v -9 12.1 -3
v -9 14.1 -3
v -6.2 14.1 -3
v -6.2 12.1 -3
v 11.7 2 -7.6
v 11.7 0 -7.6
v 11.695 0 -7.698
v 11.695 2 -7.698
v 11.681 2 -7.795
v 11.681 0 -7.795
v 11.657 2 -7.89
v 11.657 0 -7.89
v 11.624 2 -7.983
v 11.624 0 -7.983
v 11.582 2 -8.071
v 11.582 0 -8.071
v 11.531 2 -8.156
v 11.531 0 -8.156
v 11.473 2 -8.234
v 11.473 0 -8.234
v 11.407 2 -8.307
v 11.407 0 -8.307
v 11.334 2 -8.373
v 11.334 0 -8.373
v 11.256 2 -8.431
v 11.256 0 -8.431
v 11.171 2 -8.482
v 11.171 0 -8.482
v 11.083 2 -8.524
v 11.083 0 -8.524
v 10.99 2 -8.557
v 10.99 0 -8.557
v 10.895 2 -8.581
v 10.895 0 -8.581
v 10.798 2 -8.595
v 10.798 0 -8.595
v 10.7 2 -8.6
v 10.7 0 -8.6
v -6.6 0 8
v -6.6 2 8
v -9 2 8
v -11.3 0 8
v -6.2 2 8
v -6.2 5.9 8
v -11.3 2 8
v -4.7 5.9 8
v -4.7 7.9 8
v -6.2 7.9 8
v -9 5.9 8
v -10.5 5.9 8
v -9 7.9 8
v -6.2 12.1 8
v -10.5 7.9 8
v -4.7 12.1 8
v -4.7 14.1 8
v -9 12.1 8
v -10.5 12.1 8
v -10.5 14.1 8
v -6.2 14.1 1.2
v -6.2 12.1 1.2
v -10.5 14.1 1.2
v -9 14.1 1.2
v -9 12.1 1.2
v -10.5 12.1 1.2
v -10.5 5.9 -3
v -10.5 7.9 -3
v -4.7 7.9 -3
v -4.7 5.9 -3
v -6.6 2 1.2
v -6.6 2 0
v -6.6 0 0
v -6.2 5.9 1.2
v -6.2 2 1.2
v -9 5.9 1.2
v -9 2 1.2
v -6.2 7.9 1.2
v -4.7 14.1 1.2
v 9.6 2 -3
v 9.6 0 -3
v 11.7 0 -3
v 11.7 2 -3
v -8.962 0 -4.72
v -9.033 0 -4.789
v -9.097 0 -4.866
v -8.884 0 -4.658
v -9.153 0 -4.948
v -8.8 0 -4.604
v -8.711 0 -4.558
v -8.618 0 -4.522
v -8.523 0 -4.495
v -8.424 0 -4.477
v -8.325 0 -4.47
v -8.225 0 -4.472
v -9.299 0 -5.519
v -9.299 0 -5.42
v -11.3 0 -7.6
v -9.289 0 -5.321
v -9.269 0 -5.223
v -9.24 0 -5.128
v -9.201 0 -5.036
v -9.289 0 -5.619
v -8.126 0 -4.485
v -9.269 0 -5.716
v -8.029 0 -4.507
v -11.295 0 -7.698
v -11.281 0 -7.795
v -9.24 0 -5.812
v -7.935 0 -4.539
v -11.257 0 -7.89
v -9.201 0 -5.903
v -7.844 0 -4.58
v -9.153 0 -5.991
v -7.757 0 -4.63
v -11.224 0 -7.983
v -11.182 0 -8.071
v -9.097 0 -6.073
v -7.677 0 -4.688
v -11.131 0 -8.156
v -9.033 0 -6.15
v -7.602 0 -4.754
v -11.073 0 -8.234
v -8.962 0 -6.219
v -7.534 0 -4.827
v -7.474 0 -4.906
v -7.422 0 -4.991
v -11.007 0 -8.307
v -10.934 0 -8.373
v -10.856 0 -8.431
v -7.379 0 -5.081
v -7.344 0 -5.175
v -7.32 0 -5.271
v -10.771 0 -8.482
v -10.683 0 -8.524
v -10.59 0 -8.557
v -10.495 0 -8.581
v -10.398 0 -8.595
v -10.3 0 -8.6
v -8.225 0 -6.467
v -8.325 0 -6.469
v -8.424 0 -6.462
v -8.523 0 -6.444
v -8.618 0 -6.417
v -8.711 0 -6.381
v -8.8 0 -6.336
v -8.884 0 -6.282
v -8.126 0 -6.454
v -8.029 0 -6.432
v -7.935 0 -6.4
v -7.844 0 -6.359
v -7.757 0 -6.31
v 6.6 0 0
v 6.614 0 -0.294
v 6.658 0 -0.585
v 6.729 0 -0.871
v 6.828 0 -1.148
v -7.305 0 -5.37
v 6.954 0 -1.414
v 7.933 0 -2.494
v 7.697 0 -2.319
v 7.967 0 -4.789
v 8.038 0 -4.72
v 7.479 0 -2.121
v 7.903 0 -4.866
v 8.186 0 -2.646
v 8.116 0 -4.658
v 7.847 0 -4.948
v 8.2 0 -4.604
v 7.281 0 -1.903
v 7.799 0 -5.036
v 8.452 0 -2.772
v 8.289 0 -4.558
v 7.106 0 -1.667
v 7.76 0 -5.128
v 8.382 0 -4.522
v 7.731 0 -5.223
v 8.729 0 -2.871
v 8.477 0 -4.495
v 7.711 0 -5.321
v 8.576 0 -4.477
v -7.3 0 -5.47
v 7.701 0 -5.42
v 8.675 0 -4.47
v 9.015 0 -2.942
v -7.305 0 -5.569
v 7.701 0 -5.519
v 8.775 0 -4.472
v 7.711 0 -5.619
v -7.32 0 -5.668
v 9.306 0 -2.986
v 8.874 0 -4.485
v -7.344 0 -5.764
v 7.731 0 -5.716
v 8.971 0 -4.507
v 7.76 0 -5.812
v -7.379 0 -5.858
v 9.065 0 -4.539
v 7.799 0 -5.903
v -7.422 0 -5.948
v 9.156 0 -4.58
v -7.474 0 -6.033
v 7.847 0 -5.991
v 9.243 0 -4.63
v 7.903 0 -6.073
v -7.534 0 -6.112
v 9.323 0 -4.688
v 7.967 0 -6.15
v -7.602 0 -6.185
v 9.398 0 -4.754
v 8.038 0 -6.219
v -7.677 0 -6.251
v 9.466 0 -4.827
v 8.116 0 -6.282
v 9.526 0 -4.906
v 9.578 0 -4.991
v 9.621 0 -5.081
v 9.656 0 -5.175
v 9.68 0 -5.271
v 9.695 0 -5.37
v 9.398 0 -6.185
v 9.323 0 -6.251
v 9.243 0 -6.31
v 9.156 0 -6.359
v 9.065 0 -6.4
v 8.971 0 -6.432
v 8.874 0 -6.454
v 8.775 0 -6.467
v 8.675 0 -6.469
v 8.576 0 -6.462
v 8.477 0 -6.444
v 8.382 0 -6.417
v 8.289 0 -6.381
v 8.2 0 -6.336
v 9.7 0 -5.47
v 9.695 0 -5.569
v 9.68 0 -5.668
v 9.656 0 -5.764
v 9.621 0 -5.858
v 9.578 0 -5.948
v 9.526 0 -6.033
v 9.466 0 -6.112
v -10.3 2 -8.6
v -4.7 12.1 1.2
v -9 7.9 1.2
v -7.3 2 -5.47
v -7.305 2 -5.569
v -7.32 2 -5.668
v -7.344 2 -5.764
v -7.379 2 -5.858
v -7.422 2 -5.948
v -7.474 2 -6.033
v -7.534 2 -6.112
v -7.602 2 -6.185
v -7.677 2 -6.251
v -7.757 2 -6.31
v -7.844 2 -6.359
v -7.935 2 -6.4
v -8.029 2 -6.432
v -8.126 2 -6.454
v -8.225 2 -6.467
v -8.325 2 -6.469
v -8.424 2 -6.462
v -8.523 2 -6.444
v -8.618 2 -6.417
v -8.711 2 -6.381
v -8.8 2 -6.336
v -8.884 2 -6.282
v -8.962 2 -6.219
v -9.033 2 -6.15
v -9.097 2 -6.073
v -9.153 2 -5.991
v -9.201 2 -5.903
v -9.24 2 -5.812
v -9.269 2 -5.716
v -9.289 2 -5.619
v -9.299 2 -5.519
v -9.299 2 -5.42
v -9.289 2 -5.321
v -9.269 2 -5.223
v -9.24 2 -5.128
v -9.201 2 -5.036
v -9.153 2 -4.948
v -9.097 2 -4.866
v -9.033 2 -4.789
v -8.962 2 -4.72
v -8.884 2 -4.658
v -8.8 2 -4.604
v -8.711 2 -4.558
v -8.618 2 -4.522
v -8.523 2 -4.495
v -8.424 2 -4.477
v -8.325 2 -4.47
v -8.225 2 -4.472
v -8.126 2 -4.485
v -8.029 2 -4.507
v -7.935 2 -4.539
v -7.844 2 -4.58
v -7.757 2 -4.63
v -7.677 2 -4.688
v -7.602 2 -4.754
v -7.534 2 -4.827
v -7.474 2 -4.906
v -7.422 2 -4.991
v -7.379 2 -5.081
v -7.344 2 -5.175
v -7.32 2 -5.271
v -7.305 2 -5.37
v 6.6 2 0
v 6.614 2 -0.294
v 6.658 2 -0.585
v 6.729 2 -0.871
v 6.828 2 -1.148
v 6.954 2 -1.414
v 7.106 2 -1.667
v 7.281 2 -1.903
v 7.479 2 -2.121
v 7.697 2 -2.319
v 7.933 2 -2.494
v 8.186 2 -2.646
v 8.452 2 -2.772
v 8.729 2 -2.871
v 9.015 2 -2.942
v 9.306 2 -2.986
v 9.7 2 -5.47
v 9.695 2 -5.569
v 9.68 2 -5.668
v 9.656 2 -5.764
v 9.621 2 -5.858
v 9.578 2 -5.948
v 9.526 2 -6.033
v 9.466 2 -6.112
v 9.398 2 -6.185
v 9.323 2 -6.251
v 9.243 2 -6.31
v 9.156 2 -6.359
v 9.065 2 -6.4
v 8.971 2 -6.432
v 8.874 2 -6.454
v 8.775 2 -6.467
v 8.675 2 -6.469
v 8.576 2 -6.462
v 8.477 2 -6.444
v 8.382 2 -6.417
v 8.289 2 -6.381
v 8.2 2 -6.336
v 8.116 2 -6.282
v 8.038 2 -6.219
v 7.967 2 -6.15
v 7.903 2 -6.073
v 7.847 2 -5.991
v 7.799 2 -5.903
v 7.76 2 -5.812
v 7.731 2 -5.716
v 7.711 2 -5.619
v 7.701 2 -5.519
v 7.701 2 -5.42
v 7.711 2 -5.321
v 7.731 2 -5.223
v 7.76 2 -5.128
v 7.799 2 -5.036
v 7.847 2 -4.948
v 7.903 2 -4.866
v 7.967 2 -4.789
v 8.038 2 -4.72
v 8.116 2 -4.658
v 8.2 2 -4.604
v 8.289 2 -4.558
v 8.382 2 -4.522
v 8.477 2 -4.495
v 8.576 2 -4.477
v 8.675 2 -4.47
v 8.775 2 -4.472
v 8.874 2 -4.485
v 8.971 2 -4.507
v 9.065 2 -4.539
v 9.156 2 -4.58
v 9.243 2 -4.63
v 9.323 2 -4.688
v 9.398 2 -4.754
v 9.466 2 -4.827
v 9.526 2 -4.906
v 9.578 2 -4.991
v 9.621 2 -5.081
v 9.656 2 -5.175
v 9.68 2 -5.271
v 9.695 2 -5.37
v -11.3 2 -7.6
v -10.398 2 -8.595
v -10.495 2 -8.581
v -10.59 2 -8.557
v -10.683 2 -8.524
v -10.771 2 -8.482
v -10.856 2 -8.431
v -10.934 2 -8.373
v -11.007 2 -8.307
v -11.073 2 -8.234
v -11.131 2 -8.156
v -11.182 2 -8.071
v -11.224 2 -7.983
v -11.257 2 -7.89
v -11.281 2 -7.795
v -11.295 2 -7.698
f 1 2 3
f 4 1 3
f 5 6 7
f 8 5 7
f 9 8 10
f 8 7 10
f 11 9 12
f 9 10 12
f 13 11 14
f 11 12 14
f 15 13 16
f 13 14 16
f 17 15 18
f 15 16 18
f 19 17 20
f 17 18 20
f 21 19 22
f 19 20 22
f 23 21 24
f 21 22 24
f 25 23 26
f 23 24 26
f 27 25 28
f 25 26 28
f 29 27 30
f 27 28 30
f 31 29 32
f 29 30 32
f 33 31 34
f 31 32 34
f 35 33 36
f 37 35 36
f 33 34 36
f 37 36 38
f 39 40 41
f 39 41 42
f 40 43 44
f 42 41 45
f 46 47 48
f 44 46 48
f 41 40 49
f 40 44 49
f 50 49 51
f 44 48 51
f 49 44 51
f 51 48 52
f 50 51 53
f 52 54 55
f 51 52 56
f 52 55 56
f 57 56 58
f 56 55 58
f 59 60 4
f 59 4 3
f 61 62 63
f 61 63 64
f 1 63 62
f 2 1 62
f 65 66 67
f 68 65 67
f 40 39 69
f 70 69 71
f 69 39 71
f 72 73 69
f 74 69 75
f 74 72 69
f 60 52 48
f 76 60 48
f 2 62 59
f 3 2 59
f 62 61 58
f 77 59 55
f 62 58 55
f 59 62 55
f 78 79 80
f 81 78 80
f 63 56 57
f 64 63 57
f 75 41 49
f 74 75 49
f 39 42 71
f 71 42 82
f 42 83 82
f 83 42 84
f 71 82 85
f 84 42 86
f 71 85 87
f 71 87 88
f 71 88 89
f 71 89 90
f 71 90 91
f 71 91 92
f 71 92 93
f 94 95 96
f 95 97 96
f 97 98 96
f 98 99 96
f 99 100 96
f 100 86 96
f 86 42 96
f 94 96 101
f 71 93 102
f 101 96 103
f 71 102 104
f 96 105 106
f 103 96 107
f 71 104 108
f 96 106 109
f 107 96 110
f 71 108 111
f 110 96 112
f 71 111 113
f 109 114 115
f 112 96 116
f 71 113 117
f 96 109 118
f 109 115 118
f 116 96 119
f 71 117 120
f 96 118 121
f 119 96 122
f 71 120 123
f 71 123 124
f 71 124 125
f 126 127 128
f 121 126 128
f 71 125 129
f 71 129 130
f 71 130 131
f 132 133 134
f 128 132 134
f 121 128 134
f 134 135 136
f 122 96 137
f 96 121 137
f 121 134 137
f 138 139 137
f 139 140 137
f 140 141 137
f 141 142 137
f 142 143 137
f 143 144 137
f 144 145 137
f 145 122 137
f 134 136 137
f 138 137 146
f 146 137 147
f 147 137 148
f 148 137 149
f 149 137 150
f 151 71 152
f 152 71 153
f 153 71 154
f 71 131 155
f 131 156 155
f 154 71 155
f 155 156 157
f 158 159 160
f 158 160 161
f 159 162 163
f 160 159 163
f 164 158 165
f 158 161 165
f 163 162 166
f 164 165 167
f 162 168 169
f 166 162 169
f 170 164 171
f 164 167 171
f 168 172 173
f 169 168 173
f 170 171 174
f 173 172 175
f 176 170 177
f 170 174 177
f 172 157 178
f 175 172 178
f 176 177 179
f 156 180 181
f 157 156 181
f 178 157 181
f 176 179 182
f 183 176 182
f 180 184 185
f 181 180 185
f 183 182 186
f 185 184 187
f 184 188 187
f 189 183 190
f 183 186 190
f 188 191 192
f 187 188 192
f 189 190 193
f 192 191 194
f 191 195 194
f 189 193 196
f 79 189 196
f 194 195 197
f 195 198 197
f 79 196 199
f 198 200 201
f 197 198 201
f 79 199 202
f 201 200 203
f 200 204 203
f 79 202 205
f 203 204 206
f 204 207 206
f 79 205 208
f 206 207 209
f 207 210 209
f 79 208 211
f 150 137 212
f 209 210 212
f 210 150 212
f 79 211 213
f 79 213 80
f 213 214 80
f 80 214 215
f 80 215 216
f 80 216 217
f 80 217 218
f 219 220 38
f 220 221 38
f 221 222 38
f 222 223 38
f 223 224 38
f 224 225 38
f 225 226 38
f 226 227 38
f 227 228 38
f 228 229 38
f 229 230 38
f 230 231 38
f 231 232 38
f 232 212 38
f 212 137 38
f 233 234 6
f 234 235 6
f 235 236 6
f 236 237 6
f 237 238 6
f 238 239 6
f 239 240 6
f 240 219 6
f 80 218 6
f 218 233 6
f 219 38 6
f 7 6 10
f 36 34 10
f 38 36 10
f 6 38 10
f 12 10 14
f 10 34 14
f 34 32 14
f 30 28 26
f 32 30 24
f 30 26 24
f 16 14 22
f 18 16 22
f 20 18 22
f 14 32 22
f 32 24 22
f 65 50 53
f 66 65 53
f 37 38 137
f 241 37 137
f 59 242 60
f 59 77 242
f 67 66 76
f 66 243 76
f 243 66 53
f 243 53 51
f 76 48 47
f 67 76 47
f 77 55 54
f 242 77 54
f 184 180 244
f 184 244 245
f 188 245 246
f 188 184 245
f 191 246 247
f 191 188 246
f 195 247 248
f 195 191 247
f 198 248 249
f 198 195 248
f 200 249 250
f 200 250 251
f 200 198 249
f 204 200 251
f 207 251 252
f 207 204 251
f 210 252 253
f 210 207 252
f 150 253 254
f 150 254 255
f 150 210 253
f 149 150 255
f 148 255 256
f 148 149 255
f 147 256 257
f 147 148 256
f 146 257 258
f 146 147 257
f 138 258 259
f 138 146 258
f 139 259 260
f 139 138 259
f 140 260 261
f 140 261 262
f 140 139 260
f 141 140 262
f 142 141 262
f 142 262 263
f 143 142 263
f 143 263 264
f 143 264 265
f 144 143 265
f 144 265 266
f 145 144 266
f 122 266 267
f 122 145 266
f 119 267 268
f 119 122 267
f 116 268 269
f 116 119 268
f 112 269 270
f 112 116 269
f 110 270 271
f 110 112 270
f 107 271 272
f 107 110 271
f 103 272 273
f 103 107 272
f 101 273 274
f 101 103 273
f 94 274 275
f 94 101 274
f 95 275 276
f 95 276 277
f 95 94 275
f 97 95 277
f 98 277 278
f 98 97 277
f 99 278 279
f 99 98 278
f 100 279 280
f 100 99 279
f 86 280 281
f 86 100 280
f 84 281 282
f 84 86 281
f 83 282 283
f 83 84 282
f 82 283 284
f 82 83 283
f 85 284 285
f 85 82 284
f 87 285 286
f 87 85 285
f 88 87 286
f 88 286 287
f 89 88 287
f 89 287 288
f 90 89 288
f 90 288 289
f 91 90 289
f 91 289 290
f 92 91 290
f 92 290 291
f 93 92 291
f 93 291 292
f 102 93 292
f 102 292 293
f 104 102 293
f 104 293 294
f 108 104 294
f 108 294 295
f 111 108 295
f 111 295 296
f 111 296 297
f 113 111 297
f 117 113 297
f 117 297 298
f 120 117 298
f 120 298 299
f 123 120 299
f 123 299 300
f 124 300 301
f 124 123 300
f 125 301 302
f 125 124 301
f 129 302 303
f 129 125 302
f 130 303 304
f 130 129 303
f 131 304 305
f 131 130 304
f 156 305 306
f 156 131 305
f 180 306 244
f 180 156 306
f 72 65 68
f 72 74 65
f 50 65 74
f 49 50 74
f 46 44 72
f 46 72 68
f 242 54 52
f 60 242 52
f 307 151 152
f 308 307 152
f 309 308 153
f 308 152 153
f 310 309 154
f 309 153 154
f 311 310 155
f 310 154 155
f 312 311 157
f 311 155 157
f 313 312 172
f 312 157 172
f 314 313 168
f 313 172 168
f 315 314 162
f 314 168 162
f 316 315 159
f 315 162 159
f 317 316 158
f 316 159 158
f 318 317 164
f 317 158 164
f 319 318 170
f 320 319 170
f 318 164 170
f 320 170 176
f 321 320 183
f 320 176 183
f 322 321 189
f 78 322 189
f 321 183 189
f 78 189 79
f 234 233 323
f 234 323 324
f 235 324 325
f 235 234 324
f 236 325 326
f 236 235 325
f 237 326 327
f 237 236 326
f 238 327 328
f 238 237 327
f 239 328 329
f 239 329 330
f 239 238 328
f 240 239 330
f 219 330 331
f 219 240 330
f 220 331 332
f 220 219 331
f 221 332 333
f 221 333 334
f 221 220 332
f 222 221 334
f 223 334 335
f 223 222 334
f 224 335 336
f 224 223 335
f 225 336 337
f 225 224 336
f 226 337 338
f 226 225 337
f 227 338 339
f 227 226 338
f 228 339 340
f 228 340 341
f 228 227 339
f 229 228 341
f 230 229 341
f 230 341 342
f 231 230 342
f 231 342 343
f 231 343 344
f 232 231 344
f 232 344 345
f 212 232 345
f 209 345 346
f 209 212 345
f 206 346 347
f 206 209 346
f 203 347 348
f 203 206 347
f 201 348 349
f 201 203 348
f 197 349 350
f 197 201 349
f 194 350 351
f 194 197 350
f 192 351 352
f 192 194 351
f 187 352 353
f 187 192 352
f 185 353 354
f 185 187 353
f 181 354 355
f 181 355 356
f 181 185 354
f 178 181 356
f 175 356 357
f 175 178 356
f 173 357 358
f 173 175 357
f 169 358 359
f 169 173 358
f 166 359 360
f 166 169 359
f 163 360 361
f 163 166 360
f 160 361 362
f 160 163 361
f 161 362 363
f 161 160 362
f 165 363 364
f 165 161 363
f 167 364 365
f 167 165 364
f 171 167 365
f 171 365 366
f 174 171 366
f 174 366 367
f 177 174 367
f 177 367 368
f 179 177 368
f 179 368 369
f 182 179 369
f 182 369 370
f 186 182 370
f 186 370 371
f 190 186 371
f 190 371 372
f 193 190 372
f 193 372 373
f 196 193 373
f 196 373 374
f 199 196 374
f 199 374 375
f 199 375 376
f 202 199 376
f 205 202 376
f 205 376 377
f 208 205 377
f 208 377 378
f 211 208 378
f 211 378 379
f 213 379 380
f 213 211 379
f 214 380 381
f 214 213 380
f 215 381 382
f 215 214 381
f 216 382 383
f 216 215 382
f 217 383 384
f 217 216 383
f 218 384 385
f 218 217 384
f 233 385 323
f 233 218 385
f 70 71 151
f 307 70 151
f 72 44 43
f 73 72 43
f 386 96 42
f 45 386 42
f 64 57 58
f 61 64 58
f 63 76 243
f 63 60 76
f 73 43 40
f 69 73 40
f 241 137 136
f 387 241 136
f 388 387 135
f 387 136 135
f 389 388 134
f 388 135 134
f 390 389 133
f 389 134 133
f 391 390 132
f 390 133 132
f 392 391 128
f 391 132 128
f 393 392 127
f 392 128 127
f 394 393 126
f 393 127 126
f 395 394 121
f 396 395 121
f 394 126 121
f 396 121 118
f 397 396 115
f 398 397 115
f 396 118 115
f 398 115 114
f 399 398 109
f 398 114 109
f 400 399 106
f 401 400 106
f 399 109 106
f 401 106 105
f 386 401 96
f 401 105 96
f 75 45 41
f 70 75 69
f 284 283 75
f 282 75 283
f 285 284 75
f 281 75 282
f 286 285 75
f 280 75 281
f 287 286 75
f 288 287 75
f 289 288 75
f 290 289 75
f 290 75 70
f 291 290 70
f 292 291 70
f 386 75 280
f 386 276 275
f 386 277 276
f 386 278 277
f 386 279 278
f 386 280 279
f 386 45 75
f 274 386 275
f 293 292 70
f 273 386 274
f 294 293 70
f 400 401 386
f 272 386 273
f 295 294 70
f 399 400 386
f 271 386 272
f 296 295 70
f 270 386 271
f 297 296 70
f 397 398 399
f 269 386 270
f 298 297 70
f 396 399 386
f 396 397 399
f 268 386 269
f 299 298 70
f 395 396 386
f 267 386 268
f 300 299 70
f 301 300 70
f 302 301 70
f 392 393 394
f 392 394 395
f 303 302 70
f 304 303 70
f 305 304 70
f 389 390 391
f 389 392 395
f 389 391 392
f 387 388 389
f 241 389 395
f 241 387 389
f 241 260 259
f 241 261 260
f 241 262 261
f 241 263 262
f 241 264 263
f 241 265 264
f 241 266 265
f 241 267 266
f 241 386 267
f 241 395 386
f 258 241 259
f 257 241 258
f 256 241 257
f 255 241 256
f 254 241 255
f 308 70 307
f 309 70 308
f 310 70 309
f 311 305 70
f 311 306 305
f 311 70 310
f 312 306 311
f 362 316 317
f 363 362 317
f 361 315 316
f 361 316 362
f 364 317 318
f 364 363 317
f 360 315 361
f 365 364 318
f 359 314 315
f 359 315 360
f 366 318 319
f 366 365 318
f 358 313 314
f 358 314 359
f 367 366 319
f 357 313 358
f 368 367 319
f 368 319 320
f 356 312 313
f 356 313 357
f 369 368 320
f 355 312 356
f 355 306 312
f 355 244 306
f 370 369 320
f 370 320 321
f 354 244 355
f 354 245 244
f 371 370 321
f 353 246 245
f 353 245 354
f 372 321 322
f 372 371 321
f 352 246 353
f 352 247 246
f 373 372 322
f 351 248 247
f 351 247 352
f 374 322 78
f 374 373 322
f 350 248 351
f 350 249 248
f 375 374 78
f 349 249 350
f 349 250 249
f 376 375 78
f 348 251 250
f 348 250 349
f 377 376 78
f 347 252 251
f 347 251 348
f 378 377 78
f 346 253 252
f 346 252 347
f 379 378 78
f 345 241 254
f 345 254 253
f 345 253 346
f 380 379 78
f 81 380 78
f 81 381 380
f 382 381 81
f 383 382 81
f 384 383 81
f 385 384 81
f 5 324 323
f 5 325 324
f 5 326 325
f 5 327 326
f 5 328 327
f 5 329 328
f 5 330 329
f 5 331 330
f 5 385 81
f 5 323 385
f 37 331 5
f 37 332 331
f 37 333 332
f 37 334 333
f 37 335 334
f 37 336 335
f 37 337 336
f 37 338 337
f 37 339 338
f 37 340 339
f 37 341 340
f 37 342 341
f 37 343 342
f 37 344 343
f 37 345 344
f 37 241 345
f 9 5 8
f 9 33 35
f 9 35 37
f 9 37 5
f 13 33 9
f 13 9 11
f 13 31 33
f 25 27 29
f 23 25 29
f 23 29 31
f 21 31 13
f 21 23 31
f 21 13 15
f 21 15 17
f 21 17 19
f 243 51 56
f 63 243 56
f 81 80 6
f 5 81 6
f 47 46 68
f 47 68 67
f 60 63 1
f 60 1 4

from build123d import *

# Parameters (mm, degrees)
SKETCH1_R           = 1
BOSS_EXTRUDE1_DEPTH = 2
BOSS_EXTRUDE2_START = 8
BOSS_EXTRUDE2_DEPTH = 6.8
SKETCH3_W           = 2.8
SKETCH3_H           = 2
SKETCH3_W_2         = 5.8
BOSS_EXTRUDE3_DEPTH = 11


with BuildPart() as part:
    # Sketch1 → Boss-Extrude1 (new body)
    with BuildSketch(Plane(origin=(0, 0, 0), x_dir=(1, 0, 0), z_dir=(0, 1, 0))):
        with BuildLine():
            Line((11.7, 3), (11.7, 7.6))
            ThreePointArc((11.7, 7.6), (11.407106781, 8.307106781), (10.7, 8.6))
            Line((10.7, 8.6), (-10.3, 8.6))
            ThreePointArc((-10.3, 8.6), (-11.007106781, 8.307106781), (-11.3, 7.6))
            Line((-11.3, 7.6), (-11.3, -8))
            Line((-11.3, -8), (-6.6, -8))
            Line((-6.6, -8), (-6.6, 0))
            Line((-6.6, 0), (6.6, 0))
            ThreePointArc((6.6, 0), (7.478679656, 2.121320344), (9.6, 3))
            Line((9.6, 3), (11.7, 3))
        make_face()
        with Locations((8.7, 5.469565217)):
            Circle(SKETCH1_R, mode=Mode.SUBTRACT)
        with Locations((-8.3, 5.469565217)):
            Circle(SKETCH1_R, mode=Mode.SUBTRACT)
    extrude(amount=BOSS_EXTRUDE1_DEPTH)

    # Sketch2 → Boss-Extrude2 (add)
    with BuildSketch(Plane.XY.offset(BOSS_EXTRUDE2_START)):
        Polygon((-9, 2), (-9, 12.1), (-10.5, 12.1), (-10.5, 14.1), (-4.7, 14.1), (-4.7, 12.1), (-6.2, 12.1), (-6.2, 2), align=None)
    extrude(amount=-BOSS_EXTRUDE2_DEPTH)

    # Sketch3 → Boss-Extrude3 (add)
    with BuildSketch(Plane.XY.offset(8)):
        with Locations((-7.6, 13.1)):
            Rectangle(SKETCH3_W, SKETCH3_H)
        with Locations((-7.6, 6.9)):
            Rectangle(SKETCH3_W_2, SKETCH3_H)
    extrude(amount=-BOSS_EXTRUDE3_DEPTH)


solid = part.part
